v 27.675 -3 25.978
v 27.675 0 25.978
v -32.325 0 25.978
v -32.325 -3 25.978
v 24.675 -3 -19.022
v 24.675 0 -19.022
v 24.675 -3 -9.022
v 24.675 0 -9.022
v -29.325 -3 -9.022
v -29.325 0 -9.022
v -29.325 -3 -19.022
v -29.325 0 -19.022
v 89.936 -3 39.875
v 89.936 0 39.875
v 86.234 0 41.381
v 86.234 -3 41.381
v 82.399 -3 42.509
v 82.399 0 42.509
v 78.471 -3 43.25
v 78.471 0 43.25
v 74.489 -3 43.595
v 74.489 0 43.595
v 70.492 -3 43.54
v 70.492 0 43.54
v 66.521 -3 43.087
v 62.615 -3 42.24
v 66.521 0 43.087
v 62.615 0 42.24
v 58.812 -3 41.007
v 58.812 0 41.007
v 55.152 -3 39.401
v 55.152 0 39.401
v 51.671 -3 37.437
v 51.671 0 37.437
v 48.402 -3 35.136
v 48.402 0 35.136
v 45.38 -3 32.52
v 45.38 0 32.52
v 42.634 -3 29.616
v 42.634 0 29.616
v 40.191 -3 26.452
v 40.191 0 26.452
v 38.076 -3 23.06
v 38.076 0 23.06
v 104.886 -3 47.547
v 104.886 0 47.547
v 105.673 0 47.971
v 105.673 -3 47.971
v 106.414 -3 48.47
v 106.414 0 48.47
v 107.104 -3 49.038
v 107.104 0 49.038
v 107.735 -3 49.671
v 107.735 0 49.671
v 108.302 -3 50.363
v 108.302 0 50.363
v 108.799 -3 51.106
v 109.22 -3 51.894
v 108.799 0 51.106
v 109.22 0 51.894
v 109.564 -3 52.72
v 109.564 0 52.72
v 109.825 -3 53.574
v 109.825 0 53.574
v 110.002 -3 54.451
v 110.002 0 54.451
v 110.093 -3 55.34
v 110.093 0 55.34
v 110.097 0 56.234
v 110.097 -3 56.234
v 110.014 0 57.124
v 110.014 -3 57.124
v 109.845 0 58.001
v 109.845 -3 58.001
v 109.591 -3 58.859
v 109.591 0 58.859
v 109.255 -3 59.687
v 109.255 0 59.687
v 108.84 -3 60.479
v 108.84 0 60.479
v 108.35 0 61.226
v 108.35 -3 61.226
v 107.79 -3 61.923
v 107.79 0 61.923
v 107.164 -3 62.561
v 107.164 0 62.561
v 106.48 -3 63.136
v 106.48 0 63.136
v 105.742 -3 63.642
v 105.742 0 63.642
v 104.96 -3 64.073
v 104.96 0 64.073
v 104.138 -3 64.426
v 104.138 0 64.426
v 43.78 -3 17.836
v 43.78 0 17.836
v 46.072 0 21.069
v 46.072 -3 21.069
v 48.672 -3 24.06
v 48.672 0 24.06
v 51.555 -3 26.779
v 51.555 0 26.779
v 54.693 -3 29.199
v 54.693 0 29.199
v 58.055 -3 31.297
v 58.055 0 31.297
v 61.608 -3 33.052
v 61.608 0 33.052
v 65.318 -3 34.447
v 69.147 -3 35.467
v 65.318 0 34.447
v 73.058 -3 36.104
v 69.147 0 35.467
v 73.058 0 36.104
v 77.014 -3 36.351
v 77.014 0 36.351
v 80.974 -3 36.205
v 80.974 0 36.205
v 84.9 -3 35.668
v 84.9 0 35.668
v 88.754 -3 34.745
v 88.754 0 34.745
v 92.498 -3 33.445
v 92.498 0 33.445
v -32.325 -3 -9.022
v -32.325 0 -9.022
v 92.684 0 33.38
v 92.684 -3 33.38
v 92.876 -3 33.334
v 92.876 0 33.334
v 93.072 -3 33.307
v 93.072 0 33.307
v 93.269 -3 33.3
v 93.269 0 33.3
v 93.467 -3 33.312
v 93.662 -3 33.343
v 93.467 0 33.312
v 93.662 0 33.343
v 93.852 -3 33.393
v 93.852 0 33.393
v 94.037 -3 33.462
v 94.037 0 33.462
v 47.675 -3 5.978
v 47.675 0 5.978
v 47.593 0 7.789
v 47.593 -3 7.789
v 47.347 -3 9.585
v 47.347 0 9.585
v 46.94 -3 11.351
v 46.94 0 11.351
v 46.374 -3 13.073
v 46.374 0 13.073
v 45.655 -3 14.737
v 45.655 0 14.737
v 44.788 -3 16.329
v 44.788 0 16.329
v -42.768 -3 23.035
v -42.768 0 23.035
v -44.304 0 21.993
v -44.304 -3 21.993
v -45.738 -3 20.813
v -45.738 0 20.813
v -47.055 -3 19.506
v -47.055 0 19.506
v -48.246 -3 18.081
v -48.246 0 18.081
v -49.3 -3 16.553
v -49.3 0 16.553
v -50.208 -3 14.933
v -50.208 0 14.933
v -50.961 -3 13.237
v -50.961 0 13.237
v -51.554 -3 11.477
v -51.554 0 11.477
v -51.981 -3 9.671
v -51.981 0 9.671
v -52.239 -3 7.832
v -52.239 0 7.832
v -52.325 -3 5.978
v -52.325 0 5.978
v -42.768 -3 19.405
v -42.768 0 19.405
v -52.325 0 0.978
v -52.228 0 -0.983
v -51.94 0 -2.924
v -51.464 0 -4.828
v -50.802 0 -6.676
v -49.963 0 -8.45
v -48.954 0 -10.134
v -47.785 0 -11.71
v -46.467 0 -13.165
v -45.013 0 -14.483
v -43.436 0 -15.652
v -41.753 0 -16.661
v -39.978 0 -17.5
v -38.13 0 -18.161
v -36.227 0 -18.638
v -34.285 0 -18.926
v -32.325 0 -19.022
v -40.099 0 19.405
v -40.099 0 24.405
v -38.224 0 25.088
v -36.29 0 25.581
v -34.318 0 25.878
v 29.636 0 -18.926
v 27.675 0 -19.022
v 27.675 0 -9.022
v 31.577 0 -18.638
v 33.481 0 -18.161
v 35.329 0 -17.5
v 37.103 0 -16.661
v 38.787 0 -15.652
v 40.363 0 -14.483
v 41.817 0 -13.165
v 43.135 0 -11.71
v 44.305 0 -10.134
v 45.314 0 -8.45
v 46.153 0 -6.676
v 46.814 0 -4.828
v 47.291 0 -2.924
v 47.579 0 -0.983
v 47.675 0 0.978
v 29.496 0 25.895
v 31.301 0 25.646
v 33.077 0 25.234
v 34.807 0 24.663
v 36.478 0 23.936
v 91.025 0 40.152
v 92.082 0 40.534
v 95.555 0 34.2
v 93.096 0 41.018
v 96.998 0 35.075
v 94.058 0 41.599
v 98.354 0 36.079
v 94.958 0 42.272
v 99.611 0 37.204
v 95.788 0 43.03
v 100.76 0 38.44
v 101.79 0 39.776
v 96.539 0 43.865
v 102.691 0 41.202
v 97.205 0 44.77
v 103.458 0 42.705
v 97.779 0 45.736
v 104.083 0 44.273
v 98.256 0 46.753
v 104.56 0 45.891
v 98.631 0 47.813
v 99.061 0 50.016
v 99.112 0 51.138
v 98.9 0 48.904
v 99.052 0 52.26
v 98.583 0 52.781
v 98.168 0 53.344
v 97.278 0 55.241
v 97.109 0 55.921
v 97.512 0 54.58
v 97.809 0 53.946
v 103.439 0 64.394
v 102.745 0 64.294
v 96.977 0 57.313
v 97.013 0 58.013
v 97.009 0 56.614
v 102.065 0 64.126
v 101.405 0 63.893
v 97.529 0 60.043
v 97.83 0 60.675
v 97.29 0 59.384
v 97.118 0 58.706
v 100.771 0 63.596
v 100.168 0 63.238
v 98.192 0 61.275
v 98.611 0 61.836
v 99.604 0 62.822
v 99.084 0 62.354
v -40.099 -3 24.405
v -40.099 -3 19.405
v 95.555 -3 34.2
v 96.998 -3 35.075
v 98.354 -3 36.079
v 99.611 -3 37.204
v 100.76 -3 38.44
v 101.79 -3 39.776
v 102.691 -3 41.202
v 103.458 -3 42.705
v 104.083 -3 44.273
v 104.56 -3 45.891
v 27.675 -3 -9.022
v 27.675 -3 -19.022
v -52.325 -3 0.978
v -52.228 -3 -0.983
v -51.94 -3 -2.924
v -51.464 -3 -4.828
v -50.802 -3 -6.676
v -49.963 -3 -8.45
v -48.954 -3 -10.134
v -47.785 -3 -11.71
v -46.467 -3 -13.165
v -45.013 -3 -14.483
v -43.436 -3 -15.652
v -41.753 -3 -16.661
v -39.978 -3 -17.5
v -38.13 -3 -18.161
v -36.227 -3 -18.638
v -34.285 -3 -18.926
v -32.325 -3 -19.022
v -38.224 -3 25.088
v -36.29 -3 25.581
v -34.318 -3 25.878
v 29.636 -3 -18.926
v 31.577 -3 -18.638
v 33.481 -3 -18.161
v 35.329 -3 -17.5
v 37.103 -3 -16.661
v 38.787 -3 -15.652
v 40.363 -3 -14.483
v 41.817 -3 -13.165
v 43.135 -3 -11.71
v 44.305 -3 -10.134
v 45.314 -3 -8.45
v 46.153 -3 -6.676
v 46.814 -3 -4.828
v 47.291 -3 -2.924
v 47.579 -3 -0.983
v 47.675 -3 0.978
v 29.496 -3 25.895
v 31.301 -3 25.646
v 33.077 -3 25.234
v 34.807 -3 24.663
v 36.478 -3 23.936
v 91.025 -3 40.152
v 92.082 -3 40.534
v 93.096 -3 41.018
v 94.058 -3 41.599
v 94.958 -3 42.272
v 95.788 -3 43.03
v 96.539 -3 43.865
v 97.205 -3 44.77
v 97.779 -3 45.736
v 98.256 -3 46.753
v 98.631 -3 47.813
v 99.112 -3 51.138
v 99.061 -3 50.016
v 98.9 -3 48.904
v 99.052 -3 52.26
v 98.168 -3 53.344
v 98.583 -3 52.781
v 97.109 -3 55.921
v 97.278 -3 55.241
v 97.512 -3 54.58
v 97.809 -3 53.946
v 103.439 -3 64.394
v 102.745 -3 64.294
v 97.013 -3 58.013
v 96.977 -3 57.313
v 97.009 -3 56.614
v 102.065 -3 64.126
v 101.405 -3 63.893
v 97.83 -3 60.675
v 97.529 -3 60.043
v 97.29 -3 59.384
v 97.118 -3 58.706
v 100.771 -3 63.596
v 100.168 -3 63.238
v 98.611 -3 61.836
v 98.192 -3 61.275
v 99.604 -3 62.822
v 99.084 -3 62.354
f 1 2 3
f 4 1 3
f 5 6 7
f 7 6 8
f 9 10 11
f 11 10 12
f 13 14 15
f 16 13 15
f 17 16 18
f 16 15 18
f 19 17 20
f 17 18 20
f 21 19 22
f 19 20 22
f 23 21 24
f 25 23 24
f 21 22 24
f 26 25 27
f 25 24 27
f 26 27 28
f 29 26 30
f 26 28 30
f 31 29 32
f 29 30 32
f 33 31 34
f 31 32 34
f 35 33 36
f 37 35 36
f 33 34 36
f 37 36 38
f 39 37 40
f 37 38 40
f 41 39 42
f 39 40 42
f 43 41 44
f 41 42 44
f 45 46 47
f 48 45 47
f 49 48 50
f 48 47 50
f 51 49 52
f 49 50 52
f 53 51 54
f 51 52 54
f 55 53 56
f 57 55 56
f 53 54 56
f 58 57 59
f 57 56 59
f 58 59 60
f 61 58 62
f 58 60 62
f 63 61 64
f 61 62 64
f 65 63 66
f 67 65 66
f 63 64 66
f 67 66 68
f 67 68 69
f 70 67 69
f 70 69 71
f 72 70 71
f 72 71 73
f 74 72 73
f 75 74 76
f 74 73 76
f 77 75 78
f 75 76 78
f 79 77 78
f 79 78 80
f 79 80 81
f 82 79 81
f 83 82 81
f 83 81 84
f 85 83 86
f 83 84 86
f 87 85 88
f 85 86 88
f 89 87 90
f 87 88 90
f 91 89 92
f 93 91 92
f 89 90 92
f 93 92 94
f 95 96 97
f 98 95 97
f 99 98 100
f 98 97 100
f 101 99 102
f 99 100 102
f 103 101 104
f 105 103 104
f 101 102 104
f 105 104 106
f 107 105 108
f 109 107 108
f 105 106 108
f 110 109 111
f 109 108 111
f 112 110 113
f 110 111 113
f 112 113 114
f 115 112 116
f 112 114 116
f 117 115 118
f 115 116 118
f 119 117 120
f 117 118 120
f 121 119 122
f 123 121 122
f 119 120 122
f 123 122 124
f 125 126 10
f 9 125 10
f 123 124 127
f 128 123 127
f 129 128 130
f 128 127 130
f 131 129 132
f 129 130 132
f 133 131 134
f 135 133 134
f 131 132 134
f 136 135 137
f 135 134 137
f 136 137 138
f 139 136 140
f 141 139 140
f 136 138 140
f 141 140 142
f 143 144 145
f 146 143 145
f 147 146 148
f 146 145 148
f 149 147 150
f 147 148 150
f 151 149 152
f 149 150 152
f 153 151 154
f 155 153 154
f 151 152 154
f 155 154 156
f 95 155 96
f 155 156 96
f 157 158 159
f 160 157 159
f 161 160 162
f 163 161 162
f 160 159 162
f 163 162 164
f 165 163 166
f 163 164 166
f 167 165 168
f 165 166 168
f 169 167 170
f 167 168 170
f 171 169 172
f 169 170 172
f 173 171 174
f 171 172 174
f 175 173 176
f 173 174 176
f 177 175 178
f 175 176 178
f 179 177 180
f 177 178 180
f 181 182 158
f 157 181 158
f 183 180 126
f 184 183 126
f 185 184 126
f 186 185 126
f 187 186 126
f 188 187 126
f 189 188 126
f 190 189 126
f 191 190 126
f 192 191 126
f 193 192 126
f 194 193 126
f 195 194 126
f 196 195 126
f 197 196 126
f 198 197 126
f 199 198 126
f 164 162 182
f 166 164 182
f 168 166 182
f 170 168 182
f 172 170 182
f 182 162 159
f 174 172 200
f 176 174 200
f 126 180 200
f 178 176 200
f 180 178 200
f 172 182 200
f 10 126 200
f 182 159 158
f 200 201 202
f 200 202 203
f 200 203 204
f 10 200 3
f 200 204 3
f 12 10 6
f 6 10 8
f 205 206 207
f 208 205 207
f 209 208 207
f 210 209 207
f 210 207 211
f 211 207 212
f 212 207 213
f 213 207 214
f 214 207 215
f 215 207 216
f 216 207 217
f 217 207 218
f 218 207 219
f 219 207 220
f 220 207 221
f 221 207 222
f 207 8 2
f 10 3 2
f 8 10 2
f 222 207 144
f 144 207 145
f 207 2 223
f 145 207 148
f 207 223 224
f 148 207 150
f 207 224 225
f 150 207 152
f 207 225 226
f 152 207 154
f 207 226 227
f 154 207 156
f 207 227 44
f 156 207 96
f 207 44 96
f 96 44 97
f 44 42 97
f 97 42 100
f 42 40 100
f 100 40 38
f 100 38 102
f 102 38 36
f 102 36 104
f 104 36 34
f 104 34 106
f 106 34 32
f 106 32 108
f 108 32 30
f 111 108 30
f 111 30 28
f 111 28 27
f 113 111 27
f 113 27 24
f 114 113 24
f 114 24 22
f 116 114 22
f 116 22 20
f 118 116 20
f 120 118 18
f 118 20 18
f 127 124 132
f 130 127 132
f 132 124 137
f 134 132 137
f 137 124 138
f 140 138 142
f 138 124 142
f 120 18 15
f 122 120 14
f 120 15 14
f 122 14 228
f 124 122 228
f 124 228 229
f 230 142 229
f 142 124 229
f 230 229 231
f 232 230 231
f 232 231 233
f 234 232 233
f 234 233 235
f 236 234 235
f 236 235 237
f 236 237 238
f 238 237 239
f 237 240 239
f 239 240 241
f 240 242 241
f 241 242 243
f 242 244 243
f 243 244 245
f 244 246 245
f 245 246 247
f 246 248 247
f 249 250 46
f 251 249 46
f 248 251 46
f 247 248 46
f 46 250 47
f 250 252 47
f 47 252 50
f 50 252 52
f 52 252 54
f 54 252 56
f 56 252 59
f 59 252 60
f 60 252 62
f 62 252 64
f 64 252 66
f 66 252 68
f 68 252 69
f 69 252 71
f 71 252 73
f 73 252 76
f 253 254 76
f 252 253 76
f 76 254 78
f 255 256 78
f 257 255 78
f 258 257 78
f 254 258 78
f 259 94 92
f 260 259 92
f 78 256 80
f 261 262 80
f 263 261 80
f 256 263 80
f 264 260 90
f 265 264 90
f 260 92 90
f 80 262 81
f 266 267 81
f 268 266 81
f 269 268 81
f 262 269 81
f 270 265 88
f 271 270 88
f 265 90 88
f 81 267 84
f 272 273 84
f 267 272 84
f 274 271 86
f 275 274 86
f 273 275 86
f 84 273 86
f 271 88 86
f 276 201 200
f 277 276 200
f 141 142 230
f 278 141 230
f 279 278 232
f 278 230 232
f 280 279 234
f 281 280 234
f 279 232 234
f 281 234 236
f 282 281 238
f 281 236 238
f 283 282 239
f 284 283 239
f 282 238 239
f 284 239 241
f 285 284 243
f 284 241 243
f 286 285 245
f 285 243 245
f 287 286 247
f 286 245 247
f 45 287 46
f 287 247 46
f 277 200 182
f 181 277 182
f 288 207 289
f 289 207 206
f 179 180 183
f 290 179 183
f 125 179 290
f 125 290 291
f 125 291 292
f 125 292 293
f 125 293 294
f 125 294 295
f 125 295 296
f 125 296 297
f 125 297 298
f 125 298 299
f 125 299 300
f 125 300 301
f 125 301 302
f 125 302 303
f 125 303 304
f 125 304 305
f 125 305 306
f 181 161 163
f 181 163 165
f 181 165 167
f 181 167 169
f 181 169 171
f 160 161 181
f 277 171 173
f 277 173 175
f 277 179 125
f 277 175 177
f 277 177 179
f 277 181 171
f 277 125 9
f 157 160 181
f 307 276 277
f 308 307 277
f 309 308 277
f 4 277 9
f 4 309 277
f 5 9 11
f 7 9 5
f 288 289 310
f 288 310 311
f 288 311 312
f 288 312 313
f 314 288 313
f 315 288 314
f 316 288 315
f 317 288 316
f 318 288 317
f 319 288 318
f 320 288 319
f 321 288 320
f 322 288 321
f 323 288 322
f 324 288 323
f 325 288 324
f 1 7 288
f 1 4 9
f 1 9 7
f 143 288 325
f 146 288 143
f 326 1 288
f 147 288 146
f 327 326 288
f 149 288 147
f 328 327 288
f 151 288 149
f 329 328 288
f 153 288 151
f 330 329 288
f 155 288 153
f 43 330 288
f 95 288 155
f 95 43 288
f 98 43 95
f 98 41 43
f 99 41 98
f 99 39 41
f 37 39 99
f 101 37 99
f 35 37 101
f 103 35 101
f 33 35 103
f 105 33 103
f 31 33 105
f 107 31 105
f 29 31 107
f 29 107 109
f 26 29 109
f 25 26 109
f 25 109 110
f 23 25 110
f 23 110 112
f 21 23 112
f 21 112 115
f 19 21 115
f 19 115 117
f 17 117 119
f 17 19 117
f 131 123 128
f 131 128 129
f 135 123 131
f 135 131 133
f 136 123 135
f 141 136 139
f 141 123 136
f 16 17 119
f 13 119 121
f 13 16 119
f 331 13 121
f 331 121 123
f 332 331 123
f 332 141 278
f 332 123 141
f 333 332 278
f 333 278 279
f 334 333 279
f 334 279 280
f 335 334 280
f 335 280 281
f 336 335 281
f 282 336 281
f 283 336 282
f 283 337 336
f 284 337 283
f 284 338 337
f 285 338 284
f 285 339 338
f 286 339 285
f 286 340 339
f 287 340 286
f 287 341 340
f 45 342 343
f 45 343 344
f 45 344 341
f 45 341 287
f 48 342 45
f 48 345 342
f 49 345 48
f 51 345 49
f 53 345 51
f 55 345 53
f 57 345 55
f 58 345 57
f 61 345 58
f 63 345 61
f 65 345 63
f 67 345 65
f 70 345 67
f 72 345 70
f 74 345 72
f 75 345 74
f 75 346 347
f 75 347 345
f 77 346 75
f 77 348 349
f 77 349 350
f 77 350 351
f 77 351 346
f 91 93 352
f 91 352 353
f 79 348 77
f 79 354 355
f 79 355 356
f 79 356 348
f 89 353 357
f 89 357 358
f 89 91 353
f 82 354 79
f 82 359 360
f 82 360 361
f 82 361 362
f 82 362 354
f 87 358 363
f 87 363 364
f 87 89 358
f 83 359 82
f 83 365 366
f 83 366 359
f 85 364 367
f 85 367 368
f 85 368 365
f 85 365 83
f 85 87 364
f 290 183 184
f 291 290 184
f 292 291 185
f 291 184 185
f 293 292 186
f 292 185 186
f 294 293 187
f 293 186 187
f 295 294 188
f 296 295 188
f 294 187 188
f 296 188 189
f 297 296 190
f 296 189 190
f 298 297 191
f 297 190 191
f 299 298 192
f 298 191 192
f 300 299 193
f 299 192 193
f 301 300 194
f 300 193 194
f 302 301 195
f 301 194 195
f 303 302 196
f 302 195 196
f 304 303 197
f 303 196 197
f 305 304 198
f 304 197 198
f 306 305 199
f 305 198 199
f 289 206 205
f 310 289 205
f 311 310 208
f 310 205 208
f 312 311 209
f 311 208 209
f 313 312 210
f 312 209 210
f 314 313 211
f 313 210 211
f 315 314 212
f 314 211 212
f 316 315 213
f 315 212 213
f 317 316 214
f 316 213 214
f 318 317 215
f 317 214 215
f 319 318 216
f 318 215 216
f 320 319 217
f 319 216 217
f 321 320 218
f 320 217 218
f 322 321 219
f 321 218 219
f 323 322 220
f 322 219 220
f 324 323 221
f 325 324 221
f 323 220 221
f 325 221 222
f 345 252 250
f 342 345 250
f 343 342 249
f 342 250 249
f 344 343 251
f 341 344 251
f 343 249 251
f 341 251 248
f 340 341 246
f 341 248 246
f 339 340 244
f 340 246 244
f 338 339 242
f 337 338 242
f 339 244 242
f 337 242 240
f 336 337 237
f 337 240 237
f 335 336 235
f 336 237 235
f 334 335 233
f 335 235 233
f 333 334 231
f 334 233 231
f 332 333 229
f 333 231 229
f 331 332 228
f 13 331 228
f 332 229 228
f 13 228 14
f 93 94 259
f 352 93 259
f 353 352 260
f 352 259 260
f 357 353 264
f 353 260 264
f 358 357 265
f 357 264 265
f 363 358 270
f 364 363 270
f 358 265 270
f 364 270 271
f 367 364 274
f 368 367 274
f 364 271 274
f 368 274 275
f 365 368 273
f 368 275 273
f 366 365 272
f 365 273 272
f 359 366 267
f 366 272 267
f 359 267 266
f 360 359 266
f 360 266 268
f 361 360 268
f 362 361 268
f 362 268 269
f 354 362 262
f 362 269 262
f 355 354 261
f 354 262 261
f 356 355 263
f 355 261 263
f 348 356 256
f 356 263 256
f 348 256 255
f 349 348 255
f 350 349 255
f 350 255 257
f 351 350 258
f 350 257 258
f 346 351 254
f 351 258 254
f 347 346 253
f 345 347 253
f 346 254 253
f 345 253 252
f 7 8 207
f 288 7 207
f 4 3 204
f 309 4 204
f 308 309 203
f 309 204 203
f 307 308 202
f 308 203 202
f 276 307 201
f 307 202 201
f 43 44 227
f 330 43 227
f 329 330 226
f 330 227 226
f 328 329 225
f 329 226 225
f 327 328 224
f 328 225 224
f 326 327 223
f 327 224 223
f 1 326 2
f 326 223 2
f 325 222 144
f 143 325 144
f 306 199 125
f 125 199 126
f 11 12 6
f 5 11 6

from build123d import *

# Parameters (mm, degrees)
F1_DEPTH = 3


# Not quite as in the source:
# - ends of sketch curves that miss each other by under 0.0002 mm in the source are joined


with BuildPart() as f1:
    # F0 (on Front) → F1 (new body)
    with BuildSketch(Plane.XZ):
        with BuildLine():
            Line((27.6752540097, 25.9776275605), (-32.3247459903, 25.9776275605))
            ThreePointArc((-32.3247459903, 25.9776275605), (-36.2904670893, 25.5805114342), (-40.0987030081, 24.4049331771))
            Line((-40.0987030081, 24.4049331771), (-40.0987030081, 19.4049331771))
            Line((-40.0987030081, 19.4049331771), (-42.7675568515, 19.4049331771))
            Line((-42.7675568515, 19.4049331771), (-42.7675568515, 23.0348166993))
            ThreePointArc((-42.7675568515, 23.0348166993), (-49.7726143017, 15.7537152948), (-52.3247459903, 5.9776275605))
            Line((-52.3247459903, 5.9776275605), (-52.3247459903, 0.9776275605))
            ThreePointArc((-52.3247459903, 0.9776275605), (-46.4668816141, -13.1645080632), (-32.3247459903, -19.0223724395))
            Line((-32.3247459903, -19.0223724395), (-32.3247459903, -9.0223724395))
            Line((-32.3247459903, -9.0223724395), (-29.3247459903, -9.0223724395))
            Line((-29.3247459903, -9.0223724395), (-29.3247459903, -19.0223724395))
            Line((-29.3247459903, -19.0223724395), (24.6752540097, -19.0223724395))
            Line((24.6752540097, -19.0223724395), (24.6752540097, -9.0223724395))
            Line((24.6752540097, -9.0223724395), (27.6752540097, -9.0223724395))
            Line((27.6752540097, -9.0223724395), (27.6752540097, -19.0223724395))
            ThreePointArc((27.6752540097, -19.0223724395), (41.8173896334, -13.1645080632), (47.6752540097, 0.9776275605))
            Line((47.6752540097, 0.9776275605), (47.6752540097, 5.9776275605))
            ThreePointArc((47.6752540097, 5.9776275605), (46.6766261397, 12.2184493954), (43.7804682921, 17.8360453688))
            ThreePointArc((43.7804682921, 17.8360453688), (65.3177378121, 34.4466284435), (92.4979172096, 33.4449816105))
            ThreePointArc((92.4979172096, 33.4449816105), (93.2694445512, 33.2995729147), (94.0374965073, 33.4623435853))
            ThreePointArc((94.0374965073, 33.4623435853), (101.2901547391, 39.0961583347), (104.8859376265, 47.5466769297))
            ThreePointArc((104.8859376265, 47.5466769297), (110.0970401084, 56.2336783381), (104.1383245347, 64.4259484991))
            ThreePointArc((104.1383245347, 64.4259484991), (97.5285801831, 60.0432380566), (99.0521934878, 52.2602133107))
            ThreePointArc((99.0521934878, 52.2602133107), (96.8833215141, 44.3091582137), (89.9362853313, 39.8749765827))
            ThreePointArc((89.9362853313, 39.8749765827), (60.6981355661, 41.6708405362), (38.0764996773, 23.060194363))
            ThreePointArc((38.0764996773, 23.060194363), (33.0765808814, 25.2344618804), (27.6752540097, 25.9776275605))
        make_face()
    extrude(amount=F1_DEPTH)


solid = f1.part
